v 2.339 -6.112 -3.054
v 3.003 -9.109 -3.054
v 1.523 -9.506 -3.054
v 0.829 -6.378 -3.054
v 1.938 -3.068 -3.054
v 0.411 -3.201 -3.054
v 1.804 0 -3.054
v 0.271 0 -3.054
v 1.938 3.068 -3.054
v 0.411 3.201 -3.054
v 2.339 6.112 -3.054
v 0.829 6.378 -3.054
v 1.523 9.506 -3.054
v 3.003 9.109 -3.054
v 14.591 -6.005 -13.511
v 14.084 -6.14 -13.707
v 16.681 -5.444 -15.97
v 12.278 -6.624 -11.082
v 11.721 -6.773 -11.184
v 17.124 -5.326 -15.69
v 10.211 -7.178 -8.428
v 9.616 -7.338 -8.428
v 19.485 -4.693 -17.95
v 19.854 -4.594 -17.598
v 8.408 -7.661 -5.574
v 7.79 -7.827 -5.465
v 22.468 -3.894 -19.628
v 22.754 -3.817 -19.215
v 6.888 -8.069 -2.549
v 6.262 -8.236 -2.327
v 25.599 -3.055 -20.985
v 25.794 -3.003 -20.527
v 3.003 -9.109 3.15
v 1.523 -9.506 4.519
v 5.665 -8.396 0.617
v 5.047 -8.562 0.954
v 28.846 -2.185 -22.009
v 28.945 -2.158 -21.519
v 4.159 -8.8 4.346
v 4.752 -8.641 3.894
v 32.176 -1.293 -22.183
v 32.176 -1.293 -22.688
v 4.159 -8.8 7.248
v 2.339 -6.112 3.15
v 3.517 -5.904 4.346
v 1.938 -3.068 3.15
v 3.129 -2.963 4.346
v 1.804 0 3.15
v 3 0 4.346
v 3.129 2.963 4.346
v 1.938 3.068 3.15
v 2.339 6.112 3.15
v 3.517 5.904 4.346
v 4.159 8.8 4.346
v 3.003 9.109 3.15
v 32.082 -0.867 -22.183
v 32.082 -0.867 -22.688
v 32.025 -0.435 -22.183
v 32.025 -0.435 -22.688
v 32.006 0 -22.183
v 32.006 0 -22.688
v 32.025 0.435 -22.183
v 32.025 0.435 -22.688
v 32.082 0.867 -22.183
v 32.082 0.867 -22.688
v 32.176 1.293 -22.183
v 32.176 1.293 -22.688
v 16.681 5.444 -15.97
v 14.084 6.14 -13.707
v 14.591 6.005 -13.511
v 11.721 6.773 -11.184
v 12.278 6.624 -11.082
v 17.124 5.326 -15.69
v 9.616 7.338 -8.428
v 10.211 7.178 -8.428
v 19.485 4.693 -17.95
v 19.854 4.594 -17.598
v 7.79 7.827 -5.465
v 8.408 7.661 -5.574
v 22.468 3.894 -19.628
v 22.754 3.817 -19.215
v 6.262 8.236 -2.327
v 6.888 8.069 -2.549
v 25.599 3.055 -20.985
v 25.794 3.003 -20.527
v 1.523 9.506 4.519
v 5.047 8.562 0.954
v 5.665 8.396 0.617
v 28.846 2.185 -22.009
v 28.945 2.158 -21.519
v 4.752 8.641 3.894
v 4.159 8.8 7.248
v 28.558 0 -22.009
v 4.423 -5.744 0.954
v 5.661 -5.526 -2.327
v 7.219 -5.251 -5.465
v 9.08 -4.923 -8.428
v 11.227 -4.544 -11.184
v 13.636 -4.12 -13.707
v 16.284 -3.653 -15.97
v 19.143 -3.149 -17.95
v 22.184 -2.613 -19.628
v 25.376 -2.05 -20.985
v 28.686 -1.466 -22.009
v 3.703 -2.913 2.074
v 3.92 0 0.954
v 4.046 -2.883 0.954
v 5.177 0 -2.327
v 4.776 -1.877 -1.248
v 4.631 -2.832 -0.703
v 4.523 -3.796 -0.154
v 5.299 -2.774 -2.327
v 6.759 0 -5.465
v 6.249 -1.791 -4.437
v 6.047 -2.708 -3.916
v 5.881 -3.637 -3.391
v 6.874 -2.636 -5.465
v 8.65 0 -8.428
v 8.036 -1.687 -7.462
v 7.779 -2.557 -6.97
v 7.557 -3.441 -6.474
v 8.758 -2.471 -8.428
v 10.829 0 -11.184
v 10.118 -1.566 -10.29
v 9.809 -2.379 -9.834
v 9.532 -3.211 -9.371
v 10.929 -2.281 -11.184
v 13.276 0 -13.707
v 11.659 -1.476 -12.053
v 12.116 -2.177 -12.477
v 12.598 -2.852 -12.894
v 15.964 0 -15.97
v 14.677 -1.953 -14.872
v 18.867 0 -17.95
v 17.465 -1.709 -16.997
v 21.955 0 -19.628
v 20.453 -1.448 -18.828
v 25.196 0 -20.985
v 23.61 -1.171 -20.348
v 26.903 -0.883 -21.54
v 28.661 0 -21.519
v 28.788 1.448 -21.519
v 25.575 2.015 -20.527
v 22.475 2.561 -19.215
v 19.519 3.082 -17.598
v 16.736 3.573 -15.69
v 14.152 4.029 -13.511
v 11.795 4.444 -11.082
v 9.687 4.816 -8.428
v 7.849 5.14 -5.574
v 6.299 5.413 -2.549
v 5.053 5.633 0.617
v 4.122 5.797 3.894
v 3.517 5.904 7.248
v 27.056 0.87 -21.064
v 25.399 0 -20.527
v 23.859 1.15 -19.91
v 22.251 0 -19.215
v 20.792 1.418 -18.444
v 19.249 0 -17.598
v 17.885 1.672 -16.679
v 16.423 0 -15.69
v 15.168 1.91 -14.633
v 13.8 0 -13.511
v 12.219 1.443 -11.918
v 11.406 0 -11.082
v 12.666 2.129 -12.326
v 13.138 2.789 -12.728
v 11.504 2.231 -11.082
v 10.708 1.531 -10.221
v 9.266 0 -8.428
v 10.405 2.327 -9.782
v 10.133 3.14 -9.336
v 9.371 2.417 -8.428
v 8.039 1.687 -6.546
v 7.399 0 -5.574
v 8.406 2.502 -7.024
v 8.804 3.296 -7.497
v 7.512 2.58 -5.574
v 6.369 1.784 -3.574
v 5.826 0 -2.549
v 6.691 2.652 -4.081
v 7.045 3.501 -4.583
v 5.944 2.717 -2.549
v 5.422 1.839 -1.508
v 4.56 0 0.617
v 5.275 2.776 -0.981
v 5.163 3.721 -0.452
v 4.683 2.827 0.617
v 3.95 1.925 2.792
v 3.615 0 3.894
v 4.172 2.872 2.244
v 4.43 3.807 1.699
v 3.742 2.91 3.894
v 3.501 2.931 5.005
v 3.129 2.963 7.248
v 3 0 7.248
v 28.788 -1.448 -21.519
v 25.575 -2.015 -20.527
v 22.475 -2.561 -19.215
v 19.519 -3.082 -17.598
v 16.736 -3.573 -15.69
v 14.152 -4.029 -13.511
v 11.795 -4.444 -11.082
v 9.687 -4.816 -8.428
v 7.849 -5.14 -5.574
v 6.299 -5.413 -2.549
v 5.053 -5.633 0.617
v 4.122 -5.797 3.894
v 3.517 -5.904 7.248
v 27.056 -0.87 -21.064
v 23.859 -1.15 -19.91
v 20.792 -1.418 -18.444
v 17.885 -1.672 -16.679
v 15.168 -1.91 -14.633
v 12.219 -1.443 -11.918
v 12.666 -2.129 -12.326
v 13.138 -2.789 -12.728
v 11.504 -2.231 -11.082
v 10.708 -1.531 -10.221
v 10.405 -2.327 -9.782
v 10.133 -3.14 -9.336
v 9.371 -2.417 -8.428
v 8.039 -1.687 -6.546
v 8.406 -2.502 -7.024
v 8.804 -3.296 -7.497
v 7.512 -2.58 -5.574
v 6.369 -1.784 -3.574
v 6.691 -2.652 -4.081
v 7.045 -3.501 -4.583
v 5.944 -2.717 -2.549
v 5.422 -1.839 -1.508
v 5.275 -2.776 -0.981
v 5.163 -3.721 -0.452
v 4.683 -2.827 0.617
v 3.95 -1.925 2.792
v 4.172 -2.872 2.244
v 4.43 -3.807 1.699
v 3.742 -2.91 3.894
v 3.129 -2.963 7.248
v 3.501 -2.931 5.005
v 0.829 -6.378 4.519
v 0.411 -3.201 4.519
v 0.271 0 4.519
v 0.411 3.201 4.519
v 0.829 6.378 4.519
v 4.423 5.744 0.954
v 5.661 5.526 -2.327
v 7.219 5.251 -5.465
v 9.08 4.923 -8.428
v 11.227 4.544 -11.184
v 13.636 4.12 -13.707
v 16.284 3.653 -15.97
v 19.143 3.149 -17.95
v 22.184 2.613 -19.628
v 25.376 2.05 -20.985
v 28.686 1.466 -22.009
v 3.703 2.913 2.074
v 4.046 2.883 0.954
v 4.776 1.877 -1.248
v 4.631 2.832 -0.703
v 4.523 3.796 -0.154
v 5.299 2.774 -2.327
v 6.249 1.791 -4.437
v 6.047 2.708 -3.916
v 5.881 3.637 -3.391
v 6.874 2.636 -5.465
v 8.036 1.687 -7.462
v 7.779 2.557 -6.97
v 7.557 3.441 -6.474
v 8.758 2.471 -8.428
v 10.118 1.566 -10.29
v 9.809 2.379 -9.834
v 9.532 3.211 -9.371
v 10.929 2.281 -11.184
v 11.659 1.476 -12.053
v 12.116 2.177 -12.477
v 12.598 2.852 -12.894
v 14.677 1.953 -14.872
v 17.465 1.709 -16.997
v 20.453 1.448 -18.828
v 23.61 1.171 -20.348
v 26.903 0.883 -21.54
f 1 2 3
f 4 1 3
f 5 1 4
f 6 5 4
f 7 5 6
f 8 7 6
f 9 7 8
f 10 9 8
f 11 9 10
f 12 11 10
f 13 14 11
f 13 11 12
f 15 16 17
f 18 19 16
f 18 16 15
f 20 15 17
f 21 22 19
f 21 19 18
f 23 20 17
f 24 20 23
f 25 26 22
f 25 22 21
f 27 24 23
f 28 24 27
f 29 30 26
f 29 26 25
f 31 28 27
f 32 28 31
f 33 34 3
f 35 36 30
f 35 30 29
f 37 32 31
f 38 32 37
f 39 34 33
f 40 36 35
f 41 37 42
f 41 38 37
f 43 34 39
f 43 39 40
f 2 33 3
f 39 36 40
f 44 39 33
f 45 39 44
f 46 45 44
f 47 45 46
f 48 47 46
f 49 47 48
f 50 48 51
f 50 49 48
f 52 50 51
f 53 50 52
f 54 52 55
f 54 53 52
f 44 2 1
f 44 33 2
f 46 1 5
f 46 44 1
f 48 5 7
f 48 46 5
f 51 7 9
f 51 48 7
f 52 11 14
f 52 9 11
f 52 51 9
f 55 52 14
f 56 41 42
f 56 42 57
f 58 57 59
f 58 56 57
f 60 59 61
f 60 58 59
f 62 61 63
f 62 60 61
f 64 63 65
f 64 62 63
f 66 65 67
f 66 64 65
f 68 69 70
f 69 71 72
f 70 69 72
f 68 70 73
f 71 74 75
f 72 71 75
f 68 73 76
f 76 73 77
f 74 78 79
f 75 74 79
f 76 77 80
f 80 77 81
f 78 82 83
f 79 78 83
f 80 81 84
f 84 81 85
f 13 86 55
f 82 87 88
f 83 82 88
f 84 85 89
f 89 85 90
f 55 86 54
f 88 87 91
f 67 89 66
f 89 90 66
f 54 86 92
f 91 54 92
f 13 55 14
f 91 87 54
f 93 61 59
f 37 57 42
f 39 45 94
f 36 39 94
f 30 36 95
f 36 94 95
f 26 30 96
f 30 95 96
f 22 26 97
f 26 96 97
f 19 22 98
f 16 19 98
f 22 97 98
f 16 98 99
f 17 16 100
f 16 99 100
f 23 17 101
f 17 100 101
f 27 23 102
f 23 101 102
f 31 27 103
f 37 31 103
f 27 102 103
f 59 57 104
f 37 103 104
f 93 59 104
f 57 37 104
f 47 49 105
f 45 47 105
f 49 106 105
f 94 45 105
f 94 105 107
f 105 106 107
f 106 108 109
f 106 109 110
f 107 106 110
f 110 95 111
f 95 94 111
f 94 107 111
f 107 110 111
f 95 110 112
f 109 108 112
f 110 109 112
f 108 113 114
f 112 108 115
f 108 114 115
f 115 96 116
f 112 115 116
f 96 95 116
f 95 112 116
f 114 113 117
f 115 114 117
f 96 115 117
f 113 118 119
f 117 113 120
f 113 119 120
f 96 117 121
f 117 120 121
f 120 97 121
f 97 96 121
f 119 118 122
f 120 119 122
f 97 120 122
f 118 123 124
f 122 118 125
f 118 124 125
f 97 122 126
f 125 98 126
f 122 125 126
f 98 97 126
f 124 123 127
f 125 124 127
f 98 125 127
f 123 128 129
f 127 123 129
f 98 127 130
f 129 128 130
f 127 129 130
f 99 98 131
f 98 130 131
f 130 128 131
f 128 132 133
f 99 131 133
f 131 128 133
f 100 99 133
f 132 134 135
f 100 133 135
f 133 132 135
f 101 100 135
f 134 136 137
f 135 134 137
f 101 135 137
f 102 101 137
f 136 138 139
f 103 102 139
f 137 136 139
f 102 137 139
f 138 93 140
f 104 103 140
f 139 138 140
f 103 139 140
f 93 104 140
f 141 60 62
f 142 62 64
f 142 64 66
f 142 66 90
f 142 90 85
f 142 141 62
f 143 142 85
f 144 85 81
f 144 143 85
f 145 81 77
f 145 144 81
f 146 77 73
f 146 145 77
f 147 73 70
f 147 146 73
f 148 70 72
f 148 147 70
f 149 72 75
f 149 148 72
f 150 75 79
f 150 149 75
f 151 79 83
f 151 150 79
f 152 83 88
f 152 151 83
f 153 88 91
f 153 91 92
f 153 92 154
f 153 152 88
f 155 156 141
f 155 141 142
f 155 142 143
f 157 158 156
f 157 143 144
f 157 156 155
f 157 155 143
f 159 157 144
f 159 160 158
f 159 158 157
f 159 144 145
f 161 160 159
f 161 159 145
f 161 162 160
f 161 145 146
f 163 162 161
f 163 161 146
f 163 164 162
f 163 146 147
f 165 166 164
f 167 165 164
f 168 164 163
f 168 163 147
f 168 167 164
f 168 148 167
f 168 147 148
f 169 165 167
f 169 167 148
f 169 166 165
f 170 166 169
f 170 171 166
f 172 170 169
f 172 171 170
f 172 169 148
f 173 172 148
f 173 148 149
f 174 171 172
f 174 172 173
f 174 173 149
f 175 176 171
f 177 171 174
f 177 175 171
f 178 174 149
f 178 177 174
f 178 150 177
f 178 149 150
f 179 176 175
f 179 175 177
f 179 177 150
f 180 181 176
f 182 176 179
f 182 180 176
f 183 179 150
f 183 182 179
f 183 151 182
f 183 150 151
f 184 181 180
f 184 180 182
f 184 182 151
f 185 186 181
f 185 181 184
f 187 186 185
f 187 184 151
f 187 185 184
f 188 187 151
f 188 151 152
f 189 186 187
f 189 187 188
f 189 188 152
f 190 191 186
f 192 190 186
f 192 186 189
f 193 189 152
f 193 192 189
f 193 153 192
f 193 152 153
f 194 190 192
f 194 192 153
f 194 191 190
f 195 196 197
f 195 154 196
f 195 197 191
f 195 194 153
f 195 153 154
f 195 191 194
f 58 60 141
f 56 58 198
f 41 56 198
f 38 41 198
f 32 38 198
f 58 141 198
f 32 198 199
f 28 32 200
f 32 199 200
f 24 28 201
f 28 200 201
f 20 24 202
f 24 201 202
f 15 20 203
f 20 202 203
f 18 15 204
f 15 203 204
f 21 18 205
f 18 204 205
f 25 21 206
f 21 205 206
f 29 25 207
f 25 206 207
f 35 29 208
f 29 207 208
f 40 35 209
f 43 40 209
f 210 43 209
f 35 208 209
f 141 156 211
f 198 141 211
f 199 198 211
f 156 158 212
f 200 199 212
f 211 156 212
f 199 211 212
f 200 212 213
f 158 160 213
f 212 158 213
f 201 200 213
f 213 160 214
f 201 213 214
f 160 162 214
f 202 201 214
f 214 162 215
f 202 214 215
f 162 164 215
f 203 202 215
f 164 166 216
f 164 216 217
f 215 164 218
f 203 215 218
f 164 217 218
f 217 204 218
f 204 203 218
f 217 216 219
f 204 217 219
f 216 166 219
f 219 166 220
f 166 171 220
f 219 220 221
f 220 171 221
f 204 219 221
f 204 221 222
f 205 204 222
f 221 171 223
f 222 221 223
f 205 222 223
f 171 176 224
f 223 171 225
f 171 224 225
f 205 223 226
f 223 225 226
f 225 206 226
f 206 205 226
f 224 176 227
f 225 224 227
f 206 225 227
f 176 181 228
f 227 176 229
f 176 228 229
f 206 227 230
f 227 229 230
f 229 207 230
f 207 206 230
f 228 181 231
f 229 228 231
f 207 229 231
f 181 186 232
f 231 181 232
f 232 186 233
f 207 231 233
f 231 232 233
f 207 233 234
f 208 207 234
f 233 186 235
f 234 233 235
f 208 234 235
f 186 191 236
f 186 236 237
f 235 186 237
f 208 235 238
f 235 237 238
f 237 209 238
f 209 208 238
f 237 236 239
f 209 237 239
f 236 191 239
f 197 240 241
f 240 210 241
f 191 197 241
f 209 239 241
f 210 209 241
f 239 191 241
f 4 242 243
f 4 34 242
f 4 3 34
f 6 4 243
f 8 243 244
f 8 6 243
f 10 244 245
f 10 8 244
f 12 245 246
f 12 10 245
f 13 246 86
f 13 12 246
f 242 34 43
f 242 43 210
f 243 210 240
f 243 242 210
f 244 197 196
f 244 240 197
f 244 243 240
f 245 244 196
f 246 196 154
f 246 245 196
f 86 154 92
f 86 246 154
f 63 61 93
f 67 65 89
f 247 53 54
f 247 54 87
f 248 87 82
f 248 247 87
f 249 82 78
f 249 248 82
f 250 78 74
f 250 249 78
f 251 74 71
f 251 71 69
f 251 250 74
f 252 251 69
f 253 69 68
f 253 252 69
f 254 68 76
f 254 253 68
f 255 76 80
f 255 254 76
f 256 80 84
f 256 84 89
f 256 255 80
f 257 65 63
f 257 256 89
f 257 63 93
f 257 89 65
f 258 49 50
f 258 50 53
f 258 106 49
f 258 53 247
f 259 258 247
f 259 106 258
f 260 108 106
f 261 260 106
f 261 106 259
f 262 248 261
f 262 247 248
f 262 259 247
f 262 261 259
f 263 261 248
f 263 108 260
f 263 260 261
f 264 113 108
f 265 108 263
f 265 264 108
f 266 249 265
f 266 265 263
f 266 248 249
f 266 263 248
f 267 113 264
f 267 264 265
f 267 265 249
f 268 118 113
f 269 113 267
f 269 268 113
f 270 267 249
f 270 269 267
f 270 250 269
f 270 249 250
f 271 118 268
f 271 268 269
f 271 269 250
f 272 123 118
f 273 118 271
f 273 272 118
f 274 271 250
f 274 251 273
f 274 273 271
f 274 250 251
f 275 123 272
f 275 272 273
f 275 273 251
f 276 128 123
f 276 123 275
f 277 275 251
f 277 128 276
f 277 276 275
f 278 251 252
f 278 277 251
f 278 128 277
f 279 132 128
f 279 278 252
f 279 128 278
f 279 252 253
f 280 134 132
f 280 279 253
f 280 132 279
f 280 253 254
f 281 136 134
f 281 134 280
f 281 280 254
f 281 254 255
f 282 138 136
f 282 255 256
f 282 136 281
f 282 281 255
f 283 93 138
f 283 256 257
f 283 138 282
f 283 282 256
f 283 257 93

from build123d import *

# Parameters (mm, degrees)
F1_ANGLE = 30


with BuildPart() as f1:
    # F0 (on Front) → F1 (revolve, symmetric)
    with BuildSketch(Plane.XZ) as f1_sk:
        with BuildLine():
            ThreePointArc((32.006004, -22.18296), (12.573001, -12.326296), (3, 7.248))
            Line((3, 7.248), (0.271143, 4.519142))
            Line((0.271143, 4.519142), (0.271143, -3.053563))
            Line((0.271143, -3.053563), (1.601774, -3.053563))
            Line((1.601774, -3.053563), (1.804178, -3.053563))
            Line((1.804178, -3.053563), (1.804178, 3.149904))
            Line((1.804178, 3.149904), (3, 4.345534))
            ThreePointArc((3, 4.345534), (13.27576, -13.706999), (32.006004, -22.688268))
            Line((32.006004, -22.688268), (32.006004, -22.18296))
        make_face()
    revolve(axis=Axis((37, 0, -38.976204), (0, 0, 1)), revolution_arc=F1_ANGLE / 2)
    revolve(f1_sk.sketch, axis=Axis((37, 0, -38.976204), (0, 0, -1)), revolution_arc=F1_ANGLE / 2)


solid = f1.part
